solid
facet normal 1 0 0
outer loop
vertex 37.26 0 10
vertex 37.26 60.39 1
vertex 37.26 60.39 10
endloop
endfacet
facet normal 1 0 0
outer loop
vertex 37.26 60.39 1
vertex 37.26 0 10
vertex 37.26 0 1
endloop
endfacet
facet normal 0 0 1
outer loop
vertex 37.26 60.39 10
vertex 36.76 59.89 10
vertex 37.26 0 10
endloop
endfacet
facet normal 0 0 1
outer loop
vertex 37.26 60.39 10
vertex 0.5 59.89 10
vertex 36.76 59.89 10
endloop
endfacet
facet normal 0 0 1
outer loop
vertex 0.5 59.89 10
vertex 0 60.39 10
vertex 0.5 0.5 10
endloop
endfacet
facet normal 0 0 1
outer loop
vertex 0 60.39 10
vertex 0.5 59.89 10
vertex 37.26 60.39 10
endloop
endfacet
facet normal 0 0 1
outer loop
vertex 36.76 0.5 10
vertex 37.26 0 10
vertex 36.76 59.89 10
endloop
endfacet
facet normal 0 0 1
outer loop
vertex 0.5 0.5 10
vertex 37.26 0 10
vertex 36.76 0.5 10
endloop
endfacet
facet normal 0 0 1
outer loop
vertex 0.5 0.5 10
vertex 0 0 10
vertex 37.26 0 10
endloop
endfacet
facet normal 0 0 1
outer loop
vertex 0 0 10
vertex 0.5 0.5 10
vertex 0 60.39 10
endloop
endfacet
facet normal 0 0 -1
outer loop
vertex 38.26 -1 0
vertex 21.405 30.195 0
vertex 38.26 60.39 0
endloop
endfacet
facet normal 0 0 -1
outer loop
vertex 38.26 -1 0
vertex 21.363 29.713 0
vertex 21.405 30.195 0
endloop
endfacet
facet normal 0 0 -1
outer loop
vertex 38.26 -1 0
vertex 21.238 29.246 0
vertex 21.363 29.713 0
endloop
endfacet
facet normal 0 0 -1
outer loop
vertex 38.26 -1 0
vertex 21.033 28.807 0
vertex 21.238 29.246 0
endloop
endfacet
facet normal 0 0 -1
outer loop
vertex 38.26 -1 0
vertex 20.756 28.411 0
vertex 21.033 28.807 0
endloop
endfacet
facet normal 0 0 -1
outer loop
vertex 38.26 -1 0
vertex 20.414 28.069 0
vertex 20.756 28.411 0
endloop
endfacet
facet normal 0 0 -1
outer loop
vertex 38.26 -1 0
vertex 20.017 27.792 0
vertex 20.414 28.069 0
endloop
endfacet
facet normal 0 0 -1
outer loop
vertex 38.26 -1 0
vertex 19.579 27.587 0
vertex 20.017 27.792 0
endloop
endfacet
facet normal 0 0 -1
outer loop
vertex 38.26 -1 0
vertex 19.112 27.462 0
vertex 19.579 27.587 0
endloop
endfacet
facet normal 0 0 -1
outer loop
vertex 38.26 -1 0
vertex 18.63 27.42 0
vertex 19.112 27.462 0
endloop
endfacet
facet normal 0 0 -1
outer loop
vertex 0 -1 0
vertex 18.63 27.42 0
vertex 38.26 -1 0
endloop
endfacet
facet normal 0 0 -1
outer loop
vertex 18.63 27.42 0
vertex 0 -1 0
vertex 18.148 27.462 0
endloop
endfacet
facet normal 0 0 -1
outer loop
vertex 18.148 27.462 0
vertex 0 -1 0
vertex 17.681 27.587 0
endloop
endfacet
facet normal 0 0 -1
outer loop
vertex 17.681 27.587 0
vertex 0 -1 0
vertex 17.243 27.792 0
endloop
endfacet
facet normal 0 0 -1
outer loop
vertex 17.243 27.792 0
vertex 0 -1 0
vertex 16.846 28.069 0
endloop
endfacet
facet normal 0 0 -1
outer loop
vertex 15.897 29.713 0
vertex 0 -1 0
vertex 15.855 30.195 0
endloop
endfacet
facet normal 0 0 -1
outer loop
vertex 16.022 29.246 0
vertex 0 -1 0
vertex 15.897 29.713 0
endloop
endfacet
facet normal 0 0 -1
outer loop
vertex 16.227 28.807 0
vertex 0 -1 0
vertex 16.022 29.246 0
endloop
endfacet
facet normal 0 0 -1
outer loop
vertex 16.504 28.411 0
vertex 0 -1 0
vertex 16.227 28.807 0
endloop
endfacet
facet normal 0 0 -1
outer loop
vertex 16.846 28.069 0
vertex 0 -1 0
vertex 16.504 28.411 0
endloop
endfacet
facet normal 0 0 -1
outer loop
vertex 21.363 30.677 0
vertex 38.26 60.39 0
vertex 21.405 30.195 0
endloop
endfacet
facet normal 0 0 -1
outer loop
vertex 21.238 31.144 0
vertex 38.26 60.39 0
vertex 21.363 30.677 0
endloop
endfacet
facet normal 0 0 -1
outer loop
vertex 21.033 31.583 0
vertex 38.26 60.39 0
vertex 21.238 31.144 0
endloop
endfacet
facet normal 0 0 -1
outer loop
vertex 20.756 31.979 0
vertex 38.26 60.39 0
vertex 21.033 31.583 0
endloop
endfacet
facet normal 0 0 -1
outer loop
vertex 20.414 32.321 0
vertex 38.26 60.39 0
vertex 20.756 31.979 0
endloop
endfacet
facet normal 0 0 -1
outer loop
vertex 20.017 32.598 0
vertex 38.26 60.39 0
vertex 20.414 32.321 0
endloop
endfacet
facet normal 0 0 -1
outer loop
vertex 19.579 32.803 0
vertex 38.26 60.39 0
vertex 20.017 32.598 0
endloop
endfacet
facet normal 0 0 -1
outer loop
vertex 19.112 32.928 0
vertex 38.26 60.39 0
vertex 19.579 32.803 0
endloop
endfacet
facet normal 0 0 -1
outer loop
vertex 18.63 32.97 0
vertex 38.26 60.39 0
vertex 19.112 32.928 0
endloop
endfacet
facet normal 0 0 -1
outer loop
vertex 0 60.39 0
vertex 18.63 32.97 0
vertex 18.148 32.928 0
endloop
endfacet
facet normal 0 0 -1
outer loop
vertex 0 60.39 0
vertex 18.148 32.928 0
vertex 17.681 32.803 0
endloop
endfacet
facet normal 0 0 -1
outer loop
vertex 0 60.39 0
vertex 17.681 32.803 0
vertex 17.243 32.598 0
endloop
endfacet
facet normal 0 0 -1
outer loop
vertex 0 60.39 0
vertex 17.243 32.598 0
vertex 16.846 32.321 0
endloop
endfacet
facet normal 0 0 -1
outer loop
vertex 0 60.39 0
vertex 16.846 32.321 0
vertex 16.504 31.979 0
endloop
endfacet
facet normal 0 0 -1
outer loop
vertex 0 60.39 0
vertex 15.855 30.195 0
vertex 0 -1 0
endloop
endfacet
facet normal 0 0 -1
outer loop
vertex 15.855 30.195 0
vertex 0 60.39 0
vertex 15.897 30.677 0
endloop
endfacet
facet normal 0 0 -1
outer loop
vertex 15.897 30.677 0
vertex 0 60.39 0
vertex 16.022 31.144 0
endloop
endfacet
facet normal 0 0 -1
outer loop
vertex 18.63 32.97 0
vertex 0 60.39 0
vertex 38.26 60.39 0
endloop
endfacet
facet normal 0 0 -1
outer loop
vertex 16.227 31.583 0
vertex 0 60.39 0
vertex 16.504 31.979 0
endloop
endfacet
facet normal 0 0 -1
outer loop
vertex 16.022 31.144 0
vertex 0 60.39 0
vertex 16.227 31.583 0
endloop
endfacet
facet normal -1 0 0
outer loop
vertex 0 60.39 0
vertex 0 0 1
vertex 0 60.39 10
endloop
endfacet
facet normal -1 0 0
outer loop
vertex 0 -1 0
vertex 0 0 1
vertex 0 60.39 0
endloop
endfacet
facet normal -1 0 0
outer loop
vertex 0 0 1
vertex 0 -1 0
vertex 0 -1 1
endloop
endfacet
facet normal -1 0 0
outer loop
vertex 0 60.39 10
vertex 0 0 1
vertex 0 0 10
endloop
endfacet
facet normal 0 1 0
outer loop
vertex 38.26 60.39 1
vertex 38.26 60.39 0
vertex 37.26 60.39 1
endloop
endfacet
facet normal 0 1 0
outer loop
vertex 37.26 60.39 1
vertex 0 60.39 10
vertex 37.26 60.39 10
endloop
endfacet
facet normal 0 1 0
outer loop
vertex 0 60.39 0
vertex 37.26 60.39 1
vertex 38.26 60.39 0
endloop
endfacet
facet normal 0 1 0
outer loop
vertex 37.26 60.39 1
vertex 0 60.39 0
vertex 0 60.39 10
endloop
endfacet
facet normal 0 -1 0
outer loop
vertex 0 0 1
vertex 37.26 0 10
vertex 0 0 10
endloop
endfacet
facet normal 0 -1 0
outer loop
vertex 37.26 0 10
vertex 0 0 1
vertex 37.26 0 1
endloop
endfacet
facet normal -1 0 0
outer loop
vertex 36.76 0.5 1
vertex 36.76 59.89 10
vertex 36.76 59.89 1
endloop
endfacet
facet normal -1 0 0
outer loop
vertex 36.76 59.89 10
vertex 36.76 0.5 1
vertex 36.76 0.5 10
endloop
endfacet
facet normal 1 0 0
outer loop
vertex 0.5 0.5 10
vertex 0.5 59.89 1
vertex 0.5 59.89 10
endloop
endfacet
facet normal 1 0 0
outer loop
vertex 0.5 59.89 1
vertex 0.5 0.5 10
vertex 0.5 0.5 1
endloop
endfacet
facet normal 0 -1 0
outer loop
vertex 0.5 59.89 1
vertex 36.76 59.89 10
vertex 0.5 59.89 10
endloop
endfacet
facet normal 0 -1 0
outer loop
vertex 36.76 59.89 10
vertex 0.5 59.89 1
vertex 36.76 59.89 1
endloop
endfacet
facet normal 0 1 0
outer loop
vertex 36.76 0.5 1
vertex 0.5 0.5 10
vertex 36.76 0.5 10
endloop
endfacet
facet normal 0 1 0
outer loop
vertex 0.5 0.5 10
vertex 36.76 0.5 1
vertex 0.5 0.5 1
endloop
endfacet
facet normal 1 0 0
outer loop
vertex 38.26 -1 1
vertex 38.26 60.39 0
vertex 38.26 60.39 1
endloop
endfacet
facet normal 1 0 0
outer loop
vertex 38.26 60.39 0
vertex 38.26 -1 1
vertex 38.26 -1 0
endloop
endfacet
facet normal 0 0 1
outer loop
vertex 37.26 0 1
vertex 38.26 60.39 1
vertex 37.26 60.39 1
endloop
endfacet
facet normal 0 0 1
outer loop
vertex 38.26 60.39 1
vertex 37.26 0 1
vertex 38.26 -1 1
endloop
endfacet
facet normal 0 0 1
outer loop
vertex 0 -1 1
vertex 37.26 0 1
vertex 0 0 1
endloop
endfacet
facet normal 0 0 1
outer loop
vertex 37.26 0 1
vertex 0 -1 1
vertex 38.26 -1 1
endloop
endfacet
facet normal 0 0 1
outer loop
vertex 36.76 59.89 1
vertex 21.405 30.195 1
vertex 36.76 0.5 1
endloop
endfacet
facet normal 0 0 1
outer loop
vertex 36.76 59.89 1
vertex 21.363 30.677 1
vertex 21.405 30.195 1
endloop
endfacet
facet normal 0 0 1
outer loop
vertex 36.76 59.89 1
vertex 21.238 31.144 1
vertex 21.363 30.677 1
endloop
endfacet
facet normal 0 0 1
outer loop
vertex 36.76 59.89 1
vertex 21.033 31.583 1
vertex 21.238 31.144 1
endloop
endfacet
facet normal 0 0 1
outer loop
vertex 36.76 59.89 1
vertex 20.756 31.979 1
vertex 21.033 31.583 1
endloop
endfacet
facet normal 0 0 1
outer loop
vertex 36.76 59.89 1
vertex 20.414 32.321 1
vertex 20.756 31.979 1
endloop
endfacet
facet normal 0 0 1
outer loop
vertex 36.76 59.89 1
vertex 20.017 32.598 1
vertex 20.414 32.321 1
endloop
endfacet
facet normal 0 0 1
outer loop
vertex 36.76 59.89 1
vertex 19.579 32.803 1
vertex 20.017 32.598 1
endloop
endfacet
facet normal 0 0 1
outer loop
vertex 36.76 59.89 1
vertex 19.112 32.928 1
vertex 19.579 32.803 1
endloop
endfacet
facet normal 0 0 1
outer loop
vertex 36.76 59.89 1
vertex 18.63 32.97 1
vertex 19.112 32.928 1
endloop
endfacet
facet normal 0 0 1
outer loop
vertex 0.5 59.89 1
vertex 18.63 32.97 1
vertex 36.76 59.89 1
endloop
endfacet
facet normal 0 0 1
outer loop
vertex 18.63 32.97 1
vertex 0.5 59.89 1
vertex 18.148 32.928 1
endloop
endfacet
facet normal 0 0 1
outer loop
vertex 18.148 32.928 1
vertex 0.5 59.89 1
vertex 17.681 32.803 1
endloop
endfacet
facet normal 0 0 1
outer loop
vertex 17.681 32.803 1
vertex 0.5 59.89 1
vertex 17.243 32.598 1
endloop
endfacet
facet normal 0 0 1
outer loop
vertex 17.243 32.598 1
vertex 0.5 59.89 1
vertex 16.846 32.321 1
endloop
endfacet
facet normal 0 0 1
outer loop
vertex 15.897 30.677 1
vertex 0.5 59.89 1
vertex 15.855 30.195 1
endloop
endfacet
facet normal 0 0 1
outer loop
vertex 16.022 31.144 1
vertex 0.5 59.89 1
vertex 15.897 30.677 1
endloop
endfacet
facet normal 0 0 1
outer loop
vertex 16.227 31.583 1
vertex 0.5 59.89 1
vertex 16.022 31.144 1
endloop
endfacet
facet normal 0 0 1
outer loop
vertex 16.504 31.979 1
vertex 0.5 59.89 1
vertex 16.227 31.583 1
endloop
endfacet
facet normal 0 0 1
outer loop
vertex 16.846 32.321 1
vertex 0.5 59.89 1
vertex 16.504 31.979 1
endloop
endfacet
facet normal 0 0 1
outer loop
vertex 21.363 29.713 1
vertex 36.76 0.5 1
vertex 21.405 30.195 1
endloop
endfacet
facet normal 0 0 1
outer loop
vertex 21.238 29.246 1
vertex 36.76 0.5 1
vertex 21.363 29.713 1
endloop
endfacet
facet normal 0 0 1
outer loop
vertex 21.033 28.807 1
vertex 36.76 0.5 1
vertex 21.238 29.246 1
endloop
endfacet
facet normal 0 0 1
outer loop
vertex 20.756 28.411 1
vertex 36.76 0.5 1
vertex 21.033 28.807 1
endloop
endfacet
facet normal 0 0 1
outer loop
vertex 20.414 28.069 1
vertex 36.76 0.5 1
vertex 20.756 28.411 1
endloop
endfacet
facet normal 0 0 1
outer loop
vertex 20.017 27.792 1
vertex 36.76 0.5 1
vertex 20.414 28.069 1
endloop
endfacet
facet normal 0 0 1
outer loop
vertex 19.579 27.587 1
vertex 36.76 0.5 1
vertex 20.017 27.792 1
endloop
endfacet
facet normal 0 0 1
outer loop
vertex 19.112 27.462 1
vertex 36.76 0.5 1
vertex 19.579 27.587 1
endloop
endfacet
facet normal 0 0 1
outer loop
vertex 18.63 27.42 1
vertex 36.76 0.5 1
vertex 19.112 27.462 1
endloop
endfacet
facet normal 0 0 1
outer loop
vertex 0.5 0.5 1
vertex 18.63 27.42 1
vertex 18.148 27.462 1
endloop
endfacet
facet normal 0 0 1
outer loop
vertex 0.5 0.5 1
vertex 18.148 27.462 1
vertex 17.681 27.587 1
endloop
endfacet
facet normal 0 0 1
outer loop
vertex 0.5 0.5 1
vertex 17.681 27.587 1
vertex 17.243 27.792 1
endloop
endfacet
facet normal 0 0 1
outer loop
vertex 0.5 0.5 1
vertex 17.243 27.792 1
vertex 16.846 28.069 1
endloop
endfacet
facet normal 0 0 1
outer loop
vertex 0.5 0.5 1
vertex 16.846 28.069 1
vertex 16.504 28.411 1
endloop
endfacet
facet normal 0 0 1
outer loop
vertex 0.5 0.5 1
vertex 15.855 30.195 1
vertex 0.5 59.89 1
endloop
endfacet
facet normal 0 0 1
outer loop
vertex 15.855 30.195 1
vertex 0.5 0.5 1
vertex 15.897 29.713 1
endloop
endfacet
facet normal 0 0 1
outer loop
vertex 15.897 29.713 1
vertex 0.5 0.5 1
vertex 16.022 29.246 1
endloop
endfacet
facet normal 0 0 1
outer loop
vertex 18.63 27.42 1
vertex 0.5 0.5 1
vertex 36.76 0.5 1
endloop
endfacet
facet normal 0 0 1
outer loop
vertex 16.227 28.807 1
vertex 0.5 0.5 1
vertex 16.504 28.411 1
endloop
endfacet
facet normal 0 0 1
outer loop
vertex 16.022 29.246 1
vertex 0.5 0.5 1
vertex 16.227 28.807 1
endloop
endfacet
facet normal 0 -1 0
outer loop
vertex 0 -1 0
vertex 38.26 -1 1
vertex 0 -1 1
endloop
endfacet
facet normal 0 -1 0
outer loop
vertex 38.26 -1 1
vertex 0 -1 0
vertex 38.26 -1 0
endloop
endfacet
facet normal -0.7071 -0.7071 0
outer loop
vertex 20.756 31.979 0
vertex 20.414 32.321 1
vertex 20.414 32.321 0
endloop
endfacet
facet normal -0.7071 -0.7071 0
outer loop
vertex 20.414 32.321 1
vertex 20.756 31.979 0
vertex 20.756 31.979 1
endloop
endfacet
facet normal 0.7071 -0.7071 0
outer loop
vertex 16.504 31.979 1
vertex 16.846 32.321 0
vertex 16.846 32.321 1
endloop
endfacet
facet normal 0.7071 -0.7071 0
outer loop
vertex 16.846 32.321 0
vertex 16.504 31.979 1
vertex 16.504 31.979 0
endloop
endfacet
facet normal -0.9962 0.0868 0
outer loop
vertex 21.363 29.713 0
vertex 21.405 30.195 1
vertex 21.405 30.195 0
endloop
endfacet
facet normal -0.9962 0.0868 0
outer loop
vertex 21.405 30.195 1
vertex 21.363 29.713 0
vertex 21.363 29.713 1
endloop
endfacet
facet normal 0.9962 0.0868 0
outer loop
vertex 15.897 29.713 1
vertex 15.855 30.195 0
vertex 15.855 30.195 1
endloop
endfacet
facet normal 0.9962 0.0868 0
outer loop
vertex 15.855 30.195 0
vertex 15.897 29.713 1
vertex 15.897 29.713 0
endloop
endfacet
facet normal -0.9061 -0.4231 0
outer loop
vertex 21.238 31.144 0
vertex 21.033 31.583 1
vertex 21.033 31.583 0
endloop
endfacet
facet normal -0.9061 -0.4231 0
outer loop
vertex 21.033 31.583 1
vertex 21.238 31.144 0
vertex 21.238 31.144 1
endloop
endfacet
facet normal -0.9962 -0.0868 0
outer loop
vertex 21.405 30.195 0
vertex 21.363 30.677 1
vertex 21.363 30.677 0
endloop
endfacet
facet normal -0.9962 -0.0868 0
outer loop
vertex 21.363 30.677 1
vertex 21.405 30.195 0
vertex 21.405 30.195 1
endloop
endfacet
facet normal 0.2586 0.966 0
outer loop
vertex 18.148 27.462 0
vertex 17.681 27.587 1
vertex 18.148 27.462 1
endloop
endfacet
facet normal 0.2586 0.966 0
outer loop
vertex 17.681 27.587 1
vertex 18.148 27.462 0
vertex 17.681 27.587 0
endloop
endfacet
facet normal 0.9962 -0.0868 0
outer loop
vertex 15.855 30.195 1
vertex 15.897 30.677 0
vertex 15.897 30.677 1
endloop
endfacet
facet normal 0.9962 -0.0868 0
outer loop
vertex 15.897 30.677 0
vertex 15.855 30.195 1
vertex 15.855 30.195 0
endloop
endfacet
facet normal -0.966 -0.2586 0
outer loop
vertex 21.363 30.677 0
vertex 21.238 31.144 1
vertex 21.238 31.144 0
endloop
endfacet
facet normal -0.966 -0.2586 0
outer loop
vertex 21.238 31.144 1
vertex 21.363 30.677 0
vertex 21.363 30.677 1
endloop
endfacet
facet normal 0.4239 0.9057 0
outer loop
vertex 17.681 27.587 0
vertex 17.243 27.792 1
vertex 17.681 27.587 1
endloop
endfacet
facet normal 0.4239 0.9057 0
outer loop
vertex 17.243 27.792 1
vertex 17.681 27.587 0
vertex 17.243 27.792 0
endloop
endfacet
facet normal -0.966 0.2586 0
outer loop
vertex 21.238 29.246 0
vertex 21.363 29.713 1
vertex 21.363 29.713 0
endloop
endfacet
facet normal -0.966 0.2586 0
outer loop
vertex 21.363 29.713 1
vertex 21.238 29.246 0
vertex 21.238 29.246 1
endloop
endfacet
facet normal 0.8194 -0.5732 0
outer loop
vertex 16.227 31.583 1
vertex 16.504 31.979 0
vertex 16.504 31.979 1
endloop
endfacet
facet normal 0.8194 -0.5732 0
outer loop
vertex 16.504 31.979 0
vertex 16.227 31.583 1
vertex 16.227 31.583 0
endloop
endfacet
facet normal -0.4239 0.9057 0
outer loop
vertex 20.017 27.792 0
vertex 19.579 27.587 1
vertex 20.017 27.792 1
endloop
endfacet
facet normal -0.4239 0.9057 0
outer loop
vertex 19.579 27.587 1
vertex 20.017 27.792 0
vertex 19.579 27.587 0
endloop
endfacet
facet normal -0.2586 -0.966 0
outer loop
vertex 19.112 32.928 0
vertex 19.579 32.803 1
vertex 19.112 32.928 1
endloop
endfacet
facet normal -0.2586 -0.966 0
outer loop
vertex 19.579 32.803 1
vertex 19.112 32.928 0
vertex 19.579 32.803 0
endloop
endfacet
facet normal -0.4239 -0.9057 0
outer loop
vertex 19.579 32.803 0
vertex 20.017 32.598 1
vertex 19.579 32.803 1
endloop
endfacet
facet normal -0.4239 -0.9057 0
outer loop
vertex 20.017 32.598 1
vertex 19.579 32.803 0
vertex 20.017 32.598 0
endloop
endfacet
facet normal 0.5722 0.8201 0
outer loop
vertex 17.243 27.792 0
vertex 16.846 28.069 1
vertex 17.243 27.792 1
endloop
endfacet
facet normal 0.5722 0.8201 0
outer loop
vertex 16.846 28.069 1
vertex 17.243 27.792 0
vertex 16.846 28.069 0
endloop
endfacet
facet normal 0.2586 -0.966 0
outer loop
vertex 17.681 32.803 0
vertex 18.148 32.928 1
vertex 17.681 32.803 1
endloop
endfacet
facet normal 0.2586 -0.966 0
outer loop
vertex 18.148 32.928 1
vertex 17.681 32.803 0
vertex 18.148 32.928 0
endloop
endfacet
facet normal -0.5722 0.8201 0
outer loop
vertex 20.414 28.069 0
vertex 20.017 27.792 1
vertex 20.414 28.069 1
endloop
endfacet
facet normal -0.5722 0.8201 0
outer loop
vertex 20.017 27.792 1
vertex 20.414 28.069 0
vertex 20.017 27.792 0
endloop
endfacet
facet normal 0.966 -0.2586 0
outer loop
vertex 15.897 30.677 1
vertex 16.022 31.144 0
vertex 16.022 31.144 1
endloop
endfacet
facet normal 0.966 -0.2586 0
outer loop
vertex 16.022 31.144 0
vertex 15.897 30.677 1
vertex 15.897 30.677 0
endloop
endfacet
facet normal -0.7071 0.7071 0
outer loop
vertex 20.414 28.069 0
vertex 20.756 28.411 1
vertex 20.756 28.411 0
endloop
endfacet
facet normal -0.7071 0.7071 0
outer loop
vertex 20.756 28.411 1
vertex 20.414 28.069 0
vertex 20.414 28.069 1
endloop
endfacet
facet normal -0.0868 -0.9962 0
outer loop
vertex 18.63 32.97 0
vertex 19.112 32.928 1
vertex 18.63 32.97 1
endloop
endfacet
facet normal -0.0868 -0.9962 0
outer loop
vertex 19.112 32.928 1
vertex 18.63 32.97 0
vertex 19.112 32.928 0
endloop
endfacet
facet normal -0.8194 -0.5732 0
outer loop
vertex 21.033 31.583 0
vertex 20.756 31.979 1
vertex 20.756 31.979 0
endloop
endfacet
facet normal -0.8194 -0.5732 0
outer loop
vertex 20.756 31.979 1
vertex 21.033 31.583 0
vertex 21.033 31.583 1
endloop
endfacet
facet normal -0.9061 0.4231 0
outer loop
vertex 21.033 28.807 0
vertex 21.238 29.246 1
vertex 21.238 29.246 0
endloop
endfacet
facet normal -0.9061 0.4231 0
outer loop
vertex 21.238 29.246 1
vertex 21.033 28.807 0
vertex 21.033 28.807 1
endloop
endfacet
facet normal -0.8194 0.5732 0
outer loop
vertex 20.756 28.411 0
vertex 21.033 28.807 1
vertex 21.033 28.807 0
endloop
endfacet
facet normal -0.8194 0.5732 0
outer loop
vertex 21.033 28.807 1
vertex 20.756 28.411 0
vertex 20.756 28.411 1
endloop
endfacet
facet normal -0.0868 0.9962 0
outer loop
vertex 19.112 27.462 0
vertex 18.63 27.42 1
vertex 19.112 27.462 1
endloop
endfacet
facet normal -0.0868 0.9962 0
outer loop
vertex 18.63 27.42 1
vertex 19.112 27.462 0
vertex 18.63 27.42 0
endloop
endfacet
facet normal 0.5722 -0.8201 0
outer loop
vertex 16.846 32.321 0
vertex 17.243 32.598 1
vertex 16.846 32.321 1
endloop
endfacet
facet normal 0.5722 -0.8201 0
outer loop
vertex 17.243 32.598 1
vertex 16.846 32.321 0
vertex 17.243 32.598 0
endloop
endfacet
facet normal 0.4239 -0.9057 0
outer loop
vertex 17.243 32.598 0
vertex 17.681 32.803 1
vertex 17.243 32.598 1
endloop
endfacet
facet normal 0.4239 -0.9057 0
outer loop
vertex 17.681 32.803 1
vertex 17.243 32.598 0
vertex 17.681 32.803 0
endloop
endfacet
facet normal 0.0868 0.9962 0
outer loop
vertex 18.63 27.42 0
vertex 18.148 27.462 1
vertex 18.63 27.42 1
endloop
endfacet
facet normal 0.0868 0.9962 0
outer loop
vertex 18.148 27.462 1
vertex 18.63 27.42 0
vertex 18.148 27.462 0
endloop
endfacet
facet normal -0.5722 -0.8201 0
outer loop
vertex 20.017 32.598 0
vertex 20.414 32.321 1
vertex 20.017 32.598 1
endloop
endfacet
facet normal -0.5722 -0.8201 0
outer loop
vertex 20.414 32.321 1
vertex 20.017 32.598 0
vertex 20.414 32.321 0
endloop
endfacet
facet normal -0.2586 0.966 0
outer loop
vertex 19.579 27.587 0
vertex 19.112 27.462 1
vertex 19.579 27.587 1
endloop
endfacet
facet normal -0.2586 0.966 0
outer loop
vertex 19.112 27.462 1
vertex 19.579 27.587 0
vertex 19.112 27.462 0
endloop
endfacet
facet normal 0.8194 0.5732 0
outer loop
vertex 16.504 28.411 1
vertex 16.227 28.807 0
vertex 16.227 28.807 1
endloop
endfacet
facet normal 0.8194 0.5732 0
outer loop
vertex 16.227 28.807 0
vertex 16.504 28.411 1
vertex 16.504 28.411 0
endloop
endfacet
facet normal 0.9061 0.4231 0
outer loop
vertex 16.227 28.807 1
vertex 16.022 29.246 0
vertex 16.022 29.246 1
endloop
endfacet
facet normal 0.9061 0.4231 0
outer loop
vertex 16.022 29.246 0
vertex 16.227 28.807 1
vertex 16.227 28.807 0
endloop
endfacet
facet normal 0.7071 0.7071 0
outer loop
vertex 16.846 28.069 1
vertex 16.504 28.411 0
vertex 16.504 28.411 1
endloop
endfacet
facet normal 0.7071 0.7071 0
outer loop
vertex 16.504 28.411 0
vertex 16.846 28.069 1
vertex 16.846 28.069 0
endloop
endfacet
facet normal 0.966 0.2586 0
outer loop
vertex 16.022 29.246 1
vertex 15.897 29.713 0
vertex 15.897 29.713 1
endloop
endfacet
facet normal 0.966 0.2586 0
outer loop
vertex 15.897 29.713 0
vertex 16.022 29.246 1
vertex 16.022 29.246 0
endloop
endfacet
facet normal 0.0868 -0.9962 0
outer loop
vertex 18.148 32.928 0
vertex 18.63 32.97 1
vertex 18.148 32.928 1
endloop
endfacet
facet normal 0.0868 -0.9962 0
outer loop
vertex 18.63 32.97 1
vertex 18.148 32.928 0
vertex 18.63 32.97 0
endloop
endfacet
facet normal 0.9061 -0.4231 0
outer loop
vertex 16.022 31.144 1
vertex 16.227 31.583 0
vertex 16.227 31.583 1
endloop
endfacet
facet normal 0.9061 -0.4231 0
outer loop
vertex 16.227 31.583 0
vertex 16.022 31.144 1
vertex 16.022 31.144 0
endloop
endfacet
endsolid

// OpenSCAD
/*
 * Copyright ©2015 Laurence Gonsalves <laurence@xenomachina.com>
 *
 * This library is free software; you can redistribute it and/or
 * modify it under the terms of the GNU Lesser General Public
 * License as published by the Free Software Foundation; either
 * version 2.1 of the License, or any later version.
 *
 * This library is distributed in the hope that it will be useful,
 * but WITHOUT ANY WARRANTY; without even the implied warranty of
 * MERCHANTABILITY or FITNESS FOR A PARTICULAR PURPOSE.  See the GNU
 * Lesser General Public License for more details.
 *
 * You should have received a copy of the GNU Lesser General Public
 * License along with this library; if not, write to:
 *   Free Software Foundation, Inc.
 *   51 Franklin Street, Fifth Floor
 *   Boston, MA  02110-1301
 *   USA
 */

$fn=36;
WIDTH = 39.54 - 2.28;
DEPTH = 81.17 - 20.78;
HEIGHT = 10;
TUBE_R = 5.15/2;

module main() {
    difference (){
        union(){
            difference (){
                cube([WIDTH, DEPTH, HEIGHT]);
                translate([.5,.5,0]) cube([WIDTH - 1 , DEPTH - 1, HEIGHT]);
            }
            translate([0,-1,0]) cube([WIDTH + 1 , DEPTH + 1, 1]);
        }
        translate([WIDTH/2, DEPTH/2, 0]) cylinder(r=TUBE_R + .2, h=HEIGHT);
    }
}

main();
